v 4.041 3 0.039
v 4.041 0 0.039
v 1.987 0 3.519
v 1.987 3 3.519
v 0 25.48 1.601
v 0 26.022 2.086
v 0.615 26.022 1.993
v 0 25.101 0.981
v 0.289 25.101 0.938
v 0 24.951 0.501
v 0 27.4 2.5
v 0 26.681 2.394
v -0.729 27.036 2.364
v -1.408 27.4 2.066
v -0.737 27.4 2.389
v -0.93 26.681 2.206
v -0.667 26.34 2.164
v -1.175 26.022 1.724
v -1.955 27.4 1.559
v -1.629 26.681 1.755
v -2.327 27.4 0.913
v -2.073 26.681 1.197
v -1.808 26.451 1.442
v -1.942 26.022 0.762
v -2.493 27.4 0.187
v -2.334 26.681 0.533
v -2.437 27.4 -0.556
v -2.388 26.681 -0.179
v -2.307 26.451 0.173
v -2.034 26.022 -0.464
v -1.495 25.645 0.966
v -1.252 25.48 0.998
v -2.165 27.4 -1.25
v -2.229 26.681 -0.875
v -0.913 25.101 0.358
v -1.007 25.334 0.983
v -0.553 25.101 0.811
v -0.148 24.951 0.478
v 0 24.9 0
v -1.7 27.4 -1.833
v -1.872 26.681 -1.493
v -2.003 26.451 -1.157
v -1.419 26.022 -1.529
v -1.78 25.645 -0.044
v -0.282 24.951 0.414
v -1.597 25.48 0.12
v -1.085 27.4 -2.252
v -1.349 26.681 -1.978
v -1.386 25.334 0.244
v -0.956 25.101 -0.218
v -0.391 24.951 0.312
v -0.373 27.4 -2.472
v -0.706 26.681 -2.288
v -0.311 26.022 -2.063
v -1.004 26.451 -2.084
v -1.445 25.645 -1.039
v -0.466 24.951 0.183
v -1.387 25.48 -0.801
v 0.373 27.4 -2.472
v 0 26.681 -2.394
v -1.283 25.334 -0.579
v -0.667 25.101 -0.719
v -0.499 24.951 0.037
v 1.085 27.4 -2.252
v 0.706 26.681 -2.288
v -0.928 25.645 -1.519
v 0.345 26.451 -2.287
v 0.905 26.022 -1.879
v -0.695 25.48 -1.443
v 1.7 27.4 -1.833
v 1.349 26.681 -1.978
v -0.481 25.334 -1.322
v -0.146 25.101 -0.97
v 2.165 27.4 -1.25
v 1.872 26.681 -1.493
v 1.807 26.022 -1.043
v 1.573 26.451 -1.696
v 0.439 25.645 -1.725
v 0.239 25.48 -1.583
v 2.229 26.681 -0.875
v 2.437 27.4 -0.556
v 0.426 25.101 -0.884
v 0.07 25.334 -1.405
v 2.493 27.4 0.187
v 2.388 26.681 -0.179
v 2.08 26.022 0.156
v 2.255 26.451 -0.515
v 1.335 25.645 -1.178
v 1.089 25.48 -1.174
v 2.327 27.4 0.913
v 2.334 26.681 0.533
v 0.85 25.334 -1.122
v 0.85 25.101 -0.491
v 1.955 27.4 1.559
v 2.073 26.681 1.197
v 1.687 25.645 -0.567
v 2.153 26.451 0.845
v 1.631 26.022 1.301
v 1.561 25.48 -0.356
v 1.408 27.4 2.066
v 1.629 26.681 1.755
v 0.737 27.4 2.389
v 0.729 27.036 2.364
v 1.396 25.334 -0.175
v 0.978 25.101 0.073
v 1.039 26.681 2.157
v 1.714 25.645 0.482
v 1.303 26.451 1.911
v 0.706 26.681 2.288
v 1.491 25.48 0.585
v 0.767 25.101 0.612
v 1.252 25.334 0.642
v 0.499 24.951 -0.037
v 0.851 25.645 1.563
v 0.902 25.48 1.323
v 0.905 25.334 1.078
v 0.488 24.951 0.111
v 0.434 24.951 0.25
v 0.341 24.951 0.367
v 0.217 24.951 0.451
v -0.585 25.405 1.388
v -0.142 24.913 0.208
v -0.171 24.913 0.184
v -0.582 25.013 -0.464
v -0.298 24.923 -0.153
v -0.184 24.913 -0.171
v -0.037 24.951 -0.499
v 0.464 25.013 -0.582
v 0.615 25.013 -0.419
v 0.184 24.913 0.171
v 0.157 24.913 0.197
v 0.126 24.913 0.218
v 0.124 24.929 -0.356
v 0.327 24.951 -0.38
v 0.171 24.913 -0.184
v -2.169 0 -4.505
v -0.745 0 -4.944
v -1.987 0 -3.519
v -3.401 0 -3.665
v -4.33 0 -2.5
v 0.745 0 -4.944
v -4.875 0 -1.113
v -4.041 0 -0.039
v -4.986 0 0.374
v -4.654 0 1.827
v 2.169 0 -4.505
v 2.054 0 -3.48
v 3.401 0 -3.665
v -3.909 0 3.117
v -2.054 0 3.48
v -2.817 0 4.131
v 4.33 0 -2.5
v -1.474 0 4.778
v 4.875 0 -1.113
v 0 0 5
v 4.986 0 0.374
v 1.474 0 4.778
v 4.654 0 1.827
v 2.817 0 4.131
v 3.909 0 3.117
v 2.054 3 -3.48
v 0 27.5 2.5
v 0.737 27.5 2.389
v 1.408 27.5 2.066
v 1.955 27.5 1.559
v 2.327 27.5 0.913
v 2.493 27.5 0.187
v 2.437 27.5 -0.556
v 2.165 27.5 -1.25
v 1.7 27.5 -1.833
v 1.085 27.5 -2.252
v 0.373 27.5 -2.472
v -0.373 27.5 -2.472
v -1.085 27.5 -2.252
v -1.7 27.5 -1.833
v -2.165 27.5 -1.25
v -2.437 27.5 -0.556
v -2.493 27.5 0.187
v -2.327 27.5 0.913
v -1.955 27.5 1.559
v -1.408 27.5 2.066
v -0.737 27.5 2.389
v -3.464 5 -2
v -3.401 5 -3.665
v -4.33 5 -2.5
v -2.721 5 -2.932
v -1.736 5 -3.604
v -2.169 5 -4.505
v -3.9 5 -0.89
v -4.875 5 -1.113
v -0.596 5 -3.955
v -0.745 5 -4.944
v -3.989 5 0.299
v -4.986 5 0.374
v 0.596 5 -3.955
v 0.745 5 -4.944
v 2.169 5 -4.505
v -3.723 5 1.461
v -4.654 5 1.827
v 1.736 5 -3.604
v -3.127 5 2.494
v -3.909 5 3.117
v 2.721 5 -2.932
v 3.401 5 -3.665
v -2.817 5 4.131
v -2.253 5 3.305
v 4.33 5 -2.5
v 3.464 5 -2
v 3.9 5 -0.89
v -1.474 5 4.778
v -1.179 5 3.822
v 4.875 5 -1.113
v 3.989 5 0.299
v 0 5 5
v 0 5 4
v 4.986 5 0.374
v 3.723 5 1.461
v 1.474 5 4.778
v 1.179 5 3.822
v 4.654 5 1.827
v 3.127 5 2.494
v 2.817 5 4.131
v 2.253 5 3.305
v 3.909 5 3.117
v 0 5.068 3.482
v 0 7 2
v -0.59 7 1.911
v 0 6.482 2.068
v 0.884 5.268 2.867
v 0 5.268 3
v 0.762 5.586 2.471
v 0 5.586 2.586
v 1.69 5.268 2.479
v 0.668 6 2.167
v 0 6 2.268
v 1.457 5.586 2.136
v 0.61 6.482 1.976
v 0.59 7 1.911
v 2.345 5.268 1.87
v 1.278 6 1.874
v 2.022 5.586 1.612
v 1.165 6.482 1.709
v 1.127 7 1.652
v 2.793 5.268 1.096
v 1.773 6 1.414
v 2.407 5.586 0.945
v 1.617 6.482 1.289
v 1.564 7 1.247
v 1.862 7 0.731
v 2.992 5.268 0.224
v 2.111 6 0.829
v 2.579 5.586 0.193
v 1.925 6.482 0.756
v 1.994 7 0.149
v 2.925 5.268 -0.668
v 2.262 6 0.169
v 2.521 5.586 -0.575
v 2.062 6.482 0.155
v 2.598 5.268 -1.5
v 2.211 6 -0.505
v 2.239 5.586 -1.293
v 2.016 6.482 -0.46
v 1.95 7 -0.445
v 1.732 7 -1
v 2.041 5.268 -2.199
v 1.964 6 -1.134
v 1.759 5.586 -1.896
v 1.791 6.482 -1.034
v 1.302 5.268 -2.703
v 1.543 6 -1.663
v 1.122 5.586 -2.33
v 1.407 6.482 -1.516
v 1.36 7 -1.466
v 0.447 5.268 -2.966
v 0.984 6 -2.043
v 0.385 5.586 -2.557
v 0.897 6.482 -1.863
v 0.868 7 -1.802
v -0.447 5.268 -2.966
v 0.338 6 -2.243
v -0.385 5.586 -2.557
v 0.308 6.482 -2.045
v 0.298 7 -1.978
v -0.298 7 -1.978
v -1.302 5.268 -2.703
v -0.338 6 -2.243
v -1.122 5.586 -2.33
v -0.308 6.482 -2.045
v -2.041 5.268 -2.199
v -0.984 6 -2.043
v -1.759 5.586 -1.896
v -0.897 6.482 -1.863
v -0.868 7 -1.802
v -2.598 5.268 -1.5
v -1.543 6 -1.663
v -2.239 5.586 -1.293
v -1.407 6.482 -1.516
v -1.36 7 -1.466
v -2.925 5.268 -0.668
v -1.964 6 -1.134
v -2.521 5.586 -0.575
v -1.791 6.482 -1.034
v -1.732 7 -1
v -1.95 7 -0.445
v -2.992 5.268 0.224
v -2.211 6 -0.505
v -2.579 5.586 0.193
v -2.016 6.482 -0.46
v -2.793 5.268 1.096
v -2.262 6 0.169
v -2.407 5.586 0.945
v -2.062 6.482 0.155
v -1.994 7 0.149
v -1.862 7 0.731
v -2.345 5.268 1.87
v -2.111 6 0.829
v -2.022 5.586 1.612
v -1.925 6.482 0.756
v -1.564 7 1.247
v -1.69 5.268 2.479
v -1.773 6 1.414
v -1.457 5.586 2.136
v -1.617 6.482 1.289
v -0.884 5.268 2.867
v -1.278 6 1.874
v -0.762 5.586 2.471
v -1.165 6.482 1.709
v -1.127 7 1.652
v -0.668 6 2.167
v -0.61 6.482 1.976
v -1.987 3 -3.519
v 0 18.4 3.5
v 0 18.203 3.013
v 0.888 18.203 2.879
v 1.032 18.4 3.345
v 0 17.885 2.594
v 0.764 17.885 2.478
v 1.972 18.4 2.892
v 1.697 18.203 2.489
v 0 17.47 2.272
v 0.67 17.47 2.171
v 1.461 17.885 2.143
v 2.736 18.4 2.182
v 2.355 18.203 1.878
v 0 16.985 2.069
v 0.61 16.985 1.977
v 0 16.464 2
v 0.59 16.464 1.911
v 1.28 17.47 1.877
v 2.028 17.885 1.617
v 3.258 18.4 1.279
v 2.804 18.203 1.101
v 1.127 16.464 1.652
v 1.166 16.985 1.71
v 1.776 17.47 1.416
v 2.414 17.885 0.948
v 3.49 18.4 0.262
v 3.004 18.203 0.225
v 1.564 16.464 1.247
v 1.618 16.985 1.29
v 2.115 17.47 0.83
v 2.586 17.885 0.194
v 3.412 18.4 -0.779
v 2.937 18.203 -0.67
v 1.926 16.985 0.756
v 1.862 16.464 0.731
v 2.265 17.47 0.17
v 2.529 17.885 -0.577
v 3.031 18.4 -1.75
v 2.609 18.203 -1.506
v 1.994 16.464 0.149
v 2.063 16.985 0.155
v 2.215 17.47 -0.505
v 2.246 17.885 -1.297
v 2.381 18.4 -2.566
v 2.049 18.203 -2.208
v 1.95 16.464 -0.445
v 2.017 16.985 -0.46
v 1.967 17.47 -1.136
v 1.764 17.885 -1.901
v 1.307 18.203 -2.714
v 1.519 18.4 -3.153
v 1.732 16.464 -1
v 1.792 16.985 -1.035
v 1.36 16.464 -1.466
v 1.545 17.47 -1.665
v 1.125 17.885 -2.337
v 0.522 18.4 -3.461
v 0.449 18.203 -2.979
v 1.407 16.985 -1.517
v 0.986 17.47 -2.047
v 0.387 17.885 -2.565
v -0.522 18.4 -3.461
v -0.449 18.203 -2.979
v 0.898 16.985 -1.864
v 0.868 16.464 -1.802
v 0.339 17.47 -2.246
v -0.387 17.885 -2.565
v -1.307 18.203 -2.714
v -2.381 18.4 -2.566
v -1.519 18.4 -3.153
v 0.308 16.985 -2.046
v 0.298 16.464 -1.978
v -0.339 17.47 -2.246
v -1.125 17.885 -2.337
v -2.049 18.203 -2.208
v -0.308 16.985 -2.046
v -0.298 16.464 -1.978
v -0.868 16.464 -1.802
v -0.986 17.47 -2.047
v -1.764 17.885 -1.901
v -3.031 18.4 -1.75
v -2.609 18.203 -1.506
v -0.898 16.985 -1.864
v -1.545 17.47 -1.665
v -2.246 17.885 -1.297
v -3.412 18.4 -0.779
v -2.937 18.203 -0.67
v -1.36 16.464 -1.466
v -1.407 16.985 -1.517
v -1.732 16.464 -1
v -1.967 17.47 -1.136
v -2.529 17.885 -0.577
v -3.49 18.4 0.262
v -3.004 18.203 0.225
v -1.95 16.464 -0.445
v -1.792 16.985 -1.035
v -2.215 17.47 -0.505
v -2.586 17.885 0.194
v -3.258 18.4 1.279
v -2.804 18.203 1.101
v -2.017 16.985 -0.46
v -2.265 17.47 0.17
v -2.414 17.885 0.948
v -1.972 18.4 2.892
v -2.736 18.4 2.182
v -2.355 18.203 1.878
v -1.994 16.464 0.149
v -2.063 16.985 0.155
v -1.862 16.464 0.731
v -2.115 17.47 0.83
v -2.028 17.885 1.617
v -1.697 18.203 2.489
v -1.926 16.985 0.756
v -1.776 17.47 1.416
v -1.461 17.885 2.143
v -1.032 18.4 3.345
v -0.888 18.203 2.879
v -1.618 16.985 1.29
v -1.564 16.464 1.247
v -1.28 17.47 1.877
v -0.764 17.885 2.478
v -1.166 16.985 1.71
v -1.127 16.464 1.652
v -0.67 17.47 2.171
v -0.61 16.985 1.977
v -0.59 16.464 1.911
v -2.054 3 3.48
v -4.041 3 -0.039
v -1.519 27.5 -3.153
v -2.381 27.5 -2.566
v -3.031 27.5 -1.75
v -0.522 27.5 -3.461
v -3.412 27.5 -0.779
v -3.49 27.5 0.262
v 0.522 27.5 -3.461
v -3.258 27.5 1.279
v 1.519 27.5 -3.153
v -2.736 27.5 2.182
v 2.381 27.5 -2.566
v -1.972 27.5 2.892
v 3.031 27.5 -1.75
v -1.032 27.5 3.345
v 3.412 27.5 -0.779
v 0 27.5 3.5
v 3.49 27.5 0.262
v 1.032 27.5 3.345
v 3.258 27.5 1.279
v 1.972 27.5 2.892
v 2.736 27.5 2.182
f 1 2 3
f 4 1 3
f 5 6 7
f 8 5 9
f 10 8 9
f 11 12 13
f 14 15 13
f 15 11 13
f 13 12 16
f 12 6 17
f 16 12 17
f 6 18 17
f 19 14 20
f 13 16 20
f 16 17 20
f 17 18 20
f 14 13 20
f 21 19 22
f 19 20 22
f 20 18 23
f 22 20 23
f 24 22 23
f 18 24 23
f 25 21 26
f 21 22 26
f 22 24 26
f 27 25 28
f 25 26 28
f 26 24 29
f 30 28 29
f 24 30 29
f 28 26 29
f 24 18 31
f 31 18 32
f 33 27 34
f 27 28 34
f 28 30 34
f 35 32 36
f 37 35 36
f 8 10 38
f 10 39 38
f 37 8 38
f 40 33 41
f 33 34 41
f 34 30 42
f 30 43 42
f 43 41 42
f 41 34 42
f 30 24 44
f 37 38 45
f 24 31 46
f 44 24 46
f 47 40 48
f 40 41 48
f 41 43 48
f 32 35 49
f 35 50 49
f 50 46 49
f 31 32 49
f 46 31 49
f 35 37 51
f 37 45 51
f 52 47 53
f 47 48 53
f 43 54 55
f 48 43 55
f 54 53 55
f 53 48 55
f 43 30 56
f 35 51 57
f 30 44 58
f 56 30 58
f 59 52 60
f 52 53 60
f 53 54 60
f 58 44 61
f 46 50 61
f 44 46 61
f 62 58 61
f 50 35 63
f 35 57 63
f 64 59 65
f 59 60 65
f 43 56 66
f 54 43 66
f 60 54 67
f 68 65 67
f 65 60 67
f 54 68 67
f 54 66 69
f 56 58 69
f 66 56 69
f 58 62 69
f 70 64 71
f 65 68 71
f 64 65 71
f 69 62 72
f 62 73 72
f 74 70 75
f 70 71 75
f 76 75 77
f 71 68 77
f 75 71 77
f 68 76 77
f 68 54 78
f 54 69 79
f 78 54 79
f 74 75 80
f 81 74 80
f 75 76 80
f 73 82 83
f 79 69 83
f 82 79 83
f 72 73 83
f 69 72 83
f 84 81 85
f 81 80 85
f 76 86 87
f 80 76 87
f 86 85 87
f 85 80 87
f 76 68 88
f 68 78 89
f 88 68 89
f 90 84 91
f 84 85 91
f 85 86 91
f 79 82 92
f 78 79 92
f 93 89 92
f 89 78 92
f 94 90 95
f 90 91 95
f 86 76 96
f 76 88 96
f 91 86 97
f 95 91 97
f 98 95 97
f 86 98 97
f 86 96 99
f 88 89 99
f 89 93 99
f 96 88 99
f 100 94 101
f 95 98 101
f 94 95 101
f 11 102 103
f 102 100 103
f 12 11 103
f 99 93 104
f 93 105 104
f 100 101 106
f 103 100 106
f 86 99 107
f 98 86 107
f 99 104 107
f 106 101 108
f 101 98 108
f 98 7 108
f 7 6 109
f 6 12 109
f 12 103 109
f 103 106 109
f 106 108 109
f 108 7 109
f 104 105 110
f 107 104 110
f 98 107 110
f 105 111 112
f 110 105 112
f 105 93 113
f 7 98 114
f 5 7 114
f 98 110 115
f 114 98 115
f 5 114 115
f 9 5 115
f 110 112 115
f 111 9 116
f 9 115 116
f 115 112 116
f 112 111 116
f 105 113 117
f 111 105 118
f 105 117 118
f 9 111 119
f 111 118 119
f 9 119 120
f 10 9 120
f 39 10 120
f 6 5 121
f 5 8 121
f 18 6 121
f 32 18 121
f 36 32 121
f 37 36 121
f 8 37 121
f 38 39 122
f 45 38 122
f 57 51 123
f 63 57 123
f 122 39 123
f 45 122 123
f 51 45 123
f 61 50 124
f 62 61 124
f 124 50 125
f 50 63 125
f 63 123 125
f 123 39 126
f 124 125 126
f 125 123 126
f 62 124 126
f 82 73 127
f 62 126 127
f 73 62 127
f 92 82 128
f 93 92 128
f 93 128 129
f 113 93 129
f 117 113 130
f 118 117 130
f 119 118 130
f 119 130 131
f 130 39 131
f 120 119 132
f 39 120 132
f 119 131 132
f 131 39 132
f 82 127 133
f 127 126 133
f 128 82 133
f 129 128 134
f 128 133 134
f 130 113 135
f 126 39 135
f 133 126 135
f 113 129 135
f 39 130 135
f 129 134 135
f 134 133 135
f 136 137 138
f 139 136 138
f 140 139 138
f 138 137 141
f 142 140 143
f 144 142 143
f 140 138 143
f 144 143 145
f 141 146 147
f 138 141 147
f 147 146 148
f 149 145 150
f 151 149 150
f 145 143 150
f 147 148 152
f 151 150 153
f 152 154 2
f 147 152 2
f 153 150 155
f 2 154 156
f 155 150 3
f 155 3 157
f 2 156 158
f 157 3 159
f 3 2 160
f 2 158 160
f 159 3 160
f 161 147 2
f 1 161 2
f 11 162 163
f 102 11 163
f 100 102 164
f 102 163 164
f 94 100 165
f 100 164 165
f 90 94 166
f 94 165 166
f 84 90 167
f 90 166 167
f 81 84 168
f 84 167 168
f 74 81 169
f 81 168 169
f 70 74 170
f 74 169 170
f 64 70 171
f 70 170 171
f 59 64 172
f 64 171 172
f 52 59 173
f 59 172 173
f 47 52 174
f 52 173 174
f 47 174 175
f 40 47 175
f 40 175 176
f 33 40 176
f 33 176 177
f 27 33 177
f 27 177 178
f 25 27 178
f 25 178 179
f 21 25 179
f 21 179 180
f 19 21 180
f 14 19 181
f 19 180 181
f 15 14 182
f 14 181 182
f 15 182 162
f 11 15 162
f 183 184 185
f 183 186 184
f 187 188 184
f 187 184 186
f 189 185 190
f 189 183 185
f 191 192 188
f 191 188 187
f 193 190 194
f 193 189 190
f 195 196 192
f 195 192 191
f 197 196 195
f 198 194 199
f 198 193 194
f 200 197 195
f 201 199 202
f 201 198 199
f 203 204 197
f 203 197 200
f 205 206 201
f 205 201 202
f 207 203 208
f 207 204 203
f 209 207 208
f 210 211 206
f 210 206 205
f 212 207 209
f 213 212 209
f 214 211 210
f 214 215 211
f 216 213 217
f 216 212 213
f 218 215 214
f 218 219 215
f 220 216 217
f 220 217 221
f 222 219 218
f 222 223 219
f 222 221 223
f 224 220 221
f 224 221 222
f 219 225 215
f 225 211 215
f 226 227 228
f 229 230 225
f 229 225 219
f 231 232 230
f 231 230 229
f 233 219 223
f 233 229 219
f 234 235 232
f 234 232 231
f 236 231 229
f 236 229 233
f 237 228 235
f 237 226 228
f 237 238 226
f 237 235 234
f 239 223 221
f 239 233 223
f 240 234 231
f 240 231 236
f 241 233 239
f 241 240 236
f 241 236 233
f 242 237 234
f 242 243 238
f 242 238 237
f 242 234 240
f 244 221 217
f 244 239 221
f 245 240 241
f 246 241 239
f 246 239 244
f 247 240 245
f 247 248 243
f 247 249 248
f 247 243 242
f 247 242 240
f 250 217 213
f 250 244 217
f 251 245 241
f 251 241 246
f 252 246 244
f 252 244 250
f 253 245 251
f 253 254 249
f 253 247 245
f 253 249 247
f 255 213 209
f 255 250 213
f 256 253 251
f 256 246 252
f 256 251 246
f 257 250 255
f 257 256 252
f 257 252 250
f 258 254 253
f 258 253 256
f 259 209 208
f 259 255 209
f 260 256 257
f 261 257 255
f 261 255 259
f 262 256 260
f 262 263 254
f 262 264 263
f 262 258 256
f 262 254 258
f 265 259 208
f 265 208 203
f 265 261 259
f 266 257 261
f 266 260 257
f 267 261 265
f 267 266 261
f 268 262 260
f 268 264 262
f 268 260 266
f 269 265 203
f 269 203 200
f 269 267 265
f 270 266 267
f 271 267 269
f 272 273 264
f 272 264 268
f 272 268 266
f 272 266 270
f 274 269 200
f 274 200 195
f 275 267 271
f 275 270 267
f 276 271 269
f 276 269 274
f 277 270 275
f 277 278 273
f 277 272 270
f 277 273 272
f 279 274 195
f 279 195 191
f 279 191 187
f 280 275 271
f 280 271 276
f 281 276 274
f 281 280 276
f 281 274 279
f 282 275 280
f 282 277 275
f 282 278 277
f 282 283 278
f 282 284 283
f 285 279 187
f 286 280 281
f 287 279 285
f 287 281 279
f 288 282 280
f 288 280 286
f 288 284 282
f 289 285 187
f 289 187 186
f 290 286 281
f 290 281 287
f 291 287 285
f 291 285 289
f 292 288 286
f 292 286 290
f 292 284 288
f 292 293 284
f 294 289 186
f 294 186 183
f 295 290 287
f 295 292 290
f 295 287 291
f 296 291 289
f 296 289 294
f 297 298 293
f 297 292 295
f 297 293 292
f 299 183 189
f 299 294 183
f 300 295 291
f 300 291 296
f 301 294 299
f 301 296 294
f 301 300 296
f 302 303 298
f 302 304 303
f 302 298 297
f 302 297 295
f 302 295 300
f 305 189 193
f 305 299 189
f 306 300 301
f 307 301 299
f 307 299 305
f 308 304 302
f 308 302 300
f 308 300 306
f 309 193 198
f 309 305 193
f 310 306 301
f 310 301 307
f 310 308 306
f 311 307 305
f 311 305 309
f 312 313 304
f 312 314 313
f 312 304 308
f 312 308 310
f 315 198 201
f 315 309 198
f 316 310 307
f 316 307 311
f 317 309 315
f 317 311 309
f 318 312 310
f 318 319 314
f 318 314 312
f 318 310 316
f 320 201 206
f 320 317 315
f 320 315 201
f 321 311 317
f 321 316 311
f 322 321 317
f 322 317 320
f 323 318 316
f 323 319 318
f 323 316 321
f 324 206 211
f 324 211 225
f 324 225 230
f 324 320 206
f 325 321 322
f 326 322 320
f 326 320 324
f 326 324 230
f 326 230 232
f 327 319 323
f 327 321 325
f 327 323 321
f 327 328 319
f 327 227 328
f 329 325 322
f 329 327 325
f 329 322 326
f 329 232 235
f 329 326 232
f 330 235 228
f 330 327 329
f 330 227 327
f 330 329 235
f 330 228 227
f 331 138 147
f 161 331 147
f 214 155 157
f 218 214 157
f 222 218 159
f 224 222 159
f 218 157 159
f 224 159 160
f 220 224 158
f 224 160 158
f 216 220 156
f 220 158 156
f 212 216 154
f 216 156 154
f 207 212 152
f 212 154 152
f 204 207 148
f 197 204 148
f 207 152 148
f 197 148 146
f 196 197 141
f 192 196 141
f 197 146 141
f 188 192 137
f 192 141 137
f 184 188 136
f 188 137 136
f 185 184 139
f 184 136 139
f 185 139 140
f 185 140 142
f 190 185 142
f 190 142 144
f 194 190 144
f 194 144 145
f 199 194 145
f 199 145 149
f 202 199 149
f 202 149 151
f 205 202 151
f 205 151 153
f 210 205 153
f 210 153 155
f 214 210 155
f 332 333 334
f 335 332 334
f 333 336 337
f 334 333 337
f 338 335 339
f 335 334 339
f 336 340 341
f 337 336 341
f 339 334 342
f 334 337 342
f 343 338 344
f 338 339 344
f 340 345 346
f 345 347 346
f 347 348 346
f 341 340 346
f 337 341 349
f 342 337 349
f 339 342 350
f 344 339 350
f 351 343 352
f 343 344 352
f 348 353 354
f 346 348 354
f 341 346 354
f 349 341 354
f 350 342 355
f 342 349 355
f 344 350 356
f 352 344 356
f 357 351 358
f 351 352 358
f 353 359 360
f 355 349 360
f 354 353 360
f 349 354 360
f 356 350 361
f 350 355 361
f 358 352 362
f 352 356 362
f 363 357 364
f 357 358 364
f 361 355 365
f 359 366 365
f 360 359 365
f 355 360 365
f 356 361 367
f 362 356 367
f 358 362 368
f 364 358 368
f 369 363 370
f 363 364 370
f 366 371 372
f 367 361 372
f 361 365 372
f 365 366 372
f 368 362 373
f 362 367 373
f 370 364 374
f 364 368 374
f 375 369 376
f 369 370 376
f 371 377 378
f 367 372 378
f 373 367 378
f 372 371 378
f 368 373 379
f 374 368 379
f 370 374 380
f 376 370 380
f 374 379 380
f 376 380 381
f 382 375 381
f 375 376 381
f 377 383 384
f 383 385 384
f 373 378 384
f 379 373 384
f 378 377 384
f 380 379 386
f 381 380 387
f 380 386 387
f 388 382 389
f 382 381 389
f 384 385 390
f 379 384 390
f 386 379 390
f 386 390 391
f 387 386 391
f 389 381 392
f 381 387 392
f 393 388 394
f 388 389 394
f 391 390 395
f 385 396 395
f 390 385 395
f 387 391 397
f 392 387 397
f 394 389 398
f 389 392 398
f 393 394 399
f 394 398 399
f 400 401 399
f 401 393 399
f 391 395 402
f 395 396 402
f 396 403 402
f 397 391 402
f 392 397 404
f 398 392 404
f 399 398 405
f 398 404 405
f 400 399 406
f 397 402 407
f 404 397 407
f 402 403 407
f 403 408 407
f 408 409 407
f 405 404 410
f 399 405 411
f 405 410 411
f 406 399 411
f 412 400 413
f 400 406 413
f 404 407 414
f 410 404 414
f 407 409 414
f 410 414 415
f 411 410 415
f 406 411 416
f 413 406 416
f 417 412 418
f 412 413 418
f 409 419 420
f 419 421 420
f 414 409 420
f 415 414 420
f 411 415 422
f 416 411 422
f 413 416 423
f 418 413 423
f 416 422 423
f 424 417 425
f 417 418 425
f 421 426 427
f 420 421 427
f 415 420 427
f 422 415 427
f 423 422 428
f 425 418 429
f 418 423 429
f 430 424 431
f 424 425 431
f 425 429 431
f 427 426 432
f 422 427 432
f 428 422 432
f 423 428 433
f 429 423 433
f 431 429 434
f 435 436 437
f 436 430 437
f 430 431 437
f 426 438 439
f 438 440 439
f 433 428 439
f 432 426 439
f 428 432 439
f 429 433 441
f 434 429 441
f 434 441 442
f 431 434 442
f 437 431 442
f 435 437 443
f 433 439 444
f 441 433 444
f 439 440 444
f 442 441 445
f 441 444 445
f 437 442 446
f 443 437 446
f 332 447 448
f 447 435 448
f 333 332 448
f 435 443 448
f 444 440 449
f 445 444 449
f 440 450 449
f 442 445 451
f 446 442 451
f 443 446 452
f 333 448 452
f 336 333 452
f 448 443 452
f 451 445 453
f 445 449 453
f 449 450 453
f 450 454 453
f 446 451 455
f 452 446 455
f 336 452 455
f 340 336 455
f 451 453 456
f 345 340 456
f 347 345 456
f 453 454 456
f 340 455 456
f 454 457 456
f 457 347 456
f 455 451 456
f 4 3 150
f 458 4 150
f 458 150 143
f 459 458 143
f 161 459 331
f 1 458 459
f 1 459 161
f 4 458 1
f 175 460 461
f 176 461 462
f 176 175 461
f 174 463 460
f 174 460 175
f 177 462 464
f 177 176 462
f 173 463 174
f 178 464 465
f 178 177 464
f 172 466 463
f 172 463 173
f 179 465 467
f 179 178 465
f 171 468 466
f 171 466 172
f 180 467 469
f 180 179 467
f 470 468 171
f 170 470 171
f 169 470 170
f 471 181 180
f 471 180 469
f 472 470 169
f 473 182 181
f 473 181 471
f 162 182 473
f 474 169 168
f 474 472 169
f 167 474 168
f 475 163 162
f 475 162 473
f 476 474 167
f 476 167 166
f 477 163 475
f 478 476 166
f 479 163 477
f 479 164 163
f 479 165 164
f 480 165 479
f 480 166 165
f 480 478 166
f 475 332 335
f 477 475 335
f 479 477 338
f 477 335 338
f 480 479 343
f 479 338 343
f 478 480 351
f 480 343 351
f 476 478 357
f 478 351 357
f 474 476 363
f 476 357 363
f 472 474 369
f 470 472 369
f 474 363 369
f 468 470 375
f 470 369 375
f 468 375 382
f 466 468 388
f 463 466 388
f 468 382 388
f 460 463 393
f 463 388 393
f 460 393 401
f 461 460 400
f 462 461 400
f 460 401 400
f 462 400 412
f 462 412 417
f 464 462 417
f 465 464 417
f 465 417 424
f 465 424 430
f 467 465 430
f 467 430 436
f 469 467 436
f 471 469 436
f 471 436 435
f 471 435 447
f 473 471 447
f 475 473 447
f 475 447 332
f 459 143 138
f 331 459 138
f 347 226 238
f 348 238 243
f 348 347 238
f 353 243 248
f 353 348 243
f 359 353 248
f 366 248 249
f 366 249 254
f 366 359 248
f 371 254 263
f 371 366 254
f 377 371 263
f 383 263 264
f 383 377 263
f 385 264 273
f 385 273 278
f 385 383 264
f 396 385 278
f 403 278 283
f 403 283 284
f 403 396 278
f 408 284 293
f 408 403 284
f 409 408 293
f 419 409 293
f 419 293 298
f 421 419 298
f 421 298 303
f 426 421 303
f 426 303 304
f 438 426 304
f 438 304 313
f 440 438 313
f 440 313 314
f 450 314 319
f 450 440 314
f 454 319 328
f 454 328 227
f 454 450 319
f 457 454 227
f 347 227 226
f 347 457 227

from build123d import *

# Parameters (mm, degrees)
SKETCH1_R           = 5
BOSS_EXTRUDE1_DEPTH = 27.5
SKETCH11_R          = 2.5
CUT_EXTRUDE3_DEPTH  = 0.1
DOME2_FACE_RADIUS   = 2.5
DOME2_HEIGHT        = 2.5
CUT_EXTRUDE4_START  = -22.5
SKETCH12_R          = 5
SKETCH12_R_2        = 3.5
CUT_EXTRUDE4_DEPTH  = 22.5
CUT_EXTRUDE5_DEPTH  = 3
SKETCH14_W          = 3
SKETCH14_H          = 13.4
FILLET2_R           = 2
FILLET3_R           = 2


with BuildPart() as part:
    # Sketch1 → Boss-Extrude1 (new body)
    with BuildSketch(Plane(origin=(0, 0, 0), x_dir=(1, 0, 0), z_dir=(0, 1, 0))):
        with Locations(Location((0, 0, 0), (0, 0, 270))):
            Circle(SKETCH1_R)
    extrude(amount=BOSS_EXTRUDE1_DEPTH)

    # Sketch11 → Cut-Extrude3 (cut)
    with BuildSketch(Plane(origin=(0, 27.5, 0), x_dir=(1, 0, 0), z_dir=(0, 1, 0))):
        with Locations(Location((0, 0, 0), (0, 0, 270))):
            Circle(SKETCH11_R)
    extrude(amount=-CUT_EXTRUDE3_DEPTH, mode=Mode.SUBTRACT)

    # Dome2: an elliptical dome of height H over a round flat face of radius A is half a spheroid: the quarter ellipse of half axes A and H revolved about the face's axis
    with BuildSketch(Plane((0, 27.4, 0), x_dir=(0, 0, 1), z_dir=(1, 0, 0)), mode=Mode.PRIVATE) as dome2_quarter:
        Ellipse(DOME2_FACE_RADIUS, DOME2_HEIGHT)
        Rectangle(DOME2_FACE_RADIUS, DOME2_HEIGHT, align=(Align.MIN, Align.MIN), mode=Mode.INTERSECT)
    revolve(dome2_quarter.sketch, axis=Axis((0, 27.4, 0), (0, -1, 0)), mode=Mode.SUBTRACT)

    # Sketch12 → Cut-Extrude4 (cut)
    with BuildSketch(Plane(origin=(0, 27.5, 0), x_dir=(1, 0, 0), z_dir=(0, 1, 0)).offset(CUT_EXTRUDE4_START)):
        with Locations(Location((0, 0, 0), (0, 0, 270))):
            Circle(SKETCH12_R)
        with Locations(Location((0, 0, 0), (0, 0, 270))):
            Circle(SKETCH12_R_2, mode=Mode.SUBTRACT)
    extrude(amount=CUT_EXTRUDE4_DEPTH, mode=Mode.SUBTRACT)

    # Sketch2 → Cut-Extrude5 (cut)
    with BuildSketch(Plane.XZ):
        Polygon((-2.054262095, 3.480422471), (-4.041265323, -0.038831925), (-1.987003228, -3.519254396), (2.054262095, -3.480422471), (4.041265323, 0.038831925), (1.987003228, 3.519254396), align=None)
    extrude(amount=-CUT_EXTRUDE5_DEPTH, mode=Mode.SUBTRACT)

    # Sketch14 → Cut-Revolve1 (revolve, cut)
    with BuildSketch(Plane.XY, mode=Mode.PRIVATE) as cut_revolve1_sk:
        with Locations((3.5, 11.7)):
            Rectangle(SKETCH14_W, SKETCH14_H)
    revolve(cut_revolve1_sk.sketch.rotate(Axis((0, 0, 0), (0, 1, 0)), 270), axis=Axis((0, 0, 0), (0, 1, 0)), mode=Mode.SUBTRACT)

    # Fillet2
    fillet2_edges = [part.edges().sort_by_distance(p)[0] for p in [
        (0, 5, -2),
    ]]
    fillet(fillet2_edges, radius=FILLET2_R)

    # Fillet3
    # the kernel refuses this fillet: 2 mm, written as the material it adds along each edge
    with BuildSketch(Plane(origin=(0, 18.4, 0), x_dir=(0, 0, 1), z_dir=(-1, 0, 0))) as fillet3_piece_1:
        with BuildLine():
            CenterArc((4, -1.936491673), FILLET3_R, 104.477512186, 75.522487814)
            Line((3.5, 0), (3.49, 0.038729833))
            ThreePointArc((3.49, 0.038729833), (2.75, 0.04), (2, 0.04))
            Line((2, 0.04), (1.96, 0))
            Line((1.96, 0), (1.96, -1.936491673))
            Line((1.96, -1.936491673), (2, -1.936491673))
        make_face()
    revolve(axis=Axis((0, 18.4, 0), (0, 1, 0)))


solid = part.part
